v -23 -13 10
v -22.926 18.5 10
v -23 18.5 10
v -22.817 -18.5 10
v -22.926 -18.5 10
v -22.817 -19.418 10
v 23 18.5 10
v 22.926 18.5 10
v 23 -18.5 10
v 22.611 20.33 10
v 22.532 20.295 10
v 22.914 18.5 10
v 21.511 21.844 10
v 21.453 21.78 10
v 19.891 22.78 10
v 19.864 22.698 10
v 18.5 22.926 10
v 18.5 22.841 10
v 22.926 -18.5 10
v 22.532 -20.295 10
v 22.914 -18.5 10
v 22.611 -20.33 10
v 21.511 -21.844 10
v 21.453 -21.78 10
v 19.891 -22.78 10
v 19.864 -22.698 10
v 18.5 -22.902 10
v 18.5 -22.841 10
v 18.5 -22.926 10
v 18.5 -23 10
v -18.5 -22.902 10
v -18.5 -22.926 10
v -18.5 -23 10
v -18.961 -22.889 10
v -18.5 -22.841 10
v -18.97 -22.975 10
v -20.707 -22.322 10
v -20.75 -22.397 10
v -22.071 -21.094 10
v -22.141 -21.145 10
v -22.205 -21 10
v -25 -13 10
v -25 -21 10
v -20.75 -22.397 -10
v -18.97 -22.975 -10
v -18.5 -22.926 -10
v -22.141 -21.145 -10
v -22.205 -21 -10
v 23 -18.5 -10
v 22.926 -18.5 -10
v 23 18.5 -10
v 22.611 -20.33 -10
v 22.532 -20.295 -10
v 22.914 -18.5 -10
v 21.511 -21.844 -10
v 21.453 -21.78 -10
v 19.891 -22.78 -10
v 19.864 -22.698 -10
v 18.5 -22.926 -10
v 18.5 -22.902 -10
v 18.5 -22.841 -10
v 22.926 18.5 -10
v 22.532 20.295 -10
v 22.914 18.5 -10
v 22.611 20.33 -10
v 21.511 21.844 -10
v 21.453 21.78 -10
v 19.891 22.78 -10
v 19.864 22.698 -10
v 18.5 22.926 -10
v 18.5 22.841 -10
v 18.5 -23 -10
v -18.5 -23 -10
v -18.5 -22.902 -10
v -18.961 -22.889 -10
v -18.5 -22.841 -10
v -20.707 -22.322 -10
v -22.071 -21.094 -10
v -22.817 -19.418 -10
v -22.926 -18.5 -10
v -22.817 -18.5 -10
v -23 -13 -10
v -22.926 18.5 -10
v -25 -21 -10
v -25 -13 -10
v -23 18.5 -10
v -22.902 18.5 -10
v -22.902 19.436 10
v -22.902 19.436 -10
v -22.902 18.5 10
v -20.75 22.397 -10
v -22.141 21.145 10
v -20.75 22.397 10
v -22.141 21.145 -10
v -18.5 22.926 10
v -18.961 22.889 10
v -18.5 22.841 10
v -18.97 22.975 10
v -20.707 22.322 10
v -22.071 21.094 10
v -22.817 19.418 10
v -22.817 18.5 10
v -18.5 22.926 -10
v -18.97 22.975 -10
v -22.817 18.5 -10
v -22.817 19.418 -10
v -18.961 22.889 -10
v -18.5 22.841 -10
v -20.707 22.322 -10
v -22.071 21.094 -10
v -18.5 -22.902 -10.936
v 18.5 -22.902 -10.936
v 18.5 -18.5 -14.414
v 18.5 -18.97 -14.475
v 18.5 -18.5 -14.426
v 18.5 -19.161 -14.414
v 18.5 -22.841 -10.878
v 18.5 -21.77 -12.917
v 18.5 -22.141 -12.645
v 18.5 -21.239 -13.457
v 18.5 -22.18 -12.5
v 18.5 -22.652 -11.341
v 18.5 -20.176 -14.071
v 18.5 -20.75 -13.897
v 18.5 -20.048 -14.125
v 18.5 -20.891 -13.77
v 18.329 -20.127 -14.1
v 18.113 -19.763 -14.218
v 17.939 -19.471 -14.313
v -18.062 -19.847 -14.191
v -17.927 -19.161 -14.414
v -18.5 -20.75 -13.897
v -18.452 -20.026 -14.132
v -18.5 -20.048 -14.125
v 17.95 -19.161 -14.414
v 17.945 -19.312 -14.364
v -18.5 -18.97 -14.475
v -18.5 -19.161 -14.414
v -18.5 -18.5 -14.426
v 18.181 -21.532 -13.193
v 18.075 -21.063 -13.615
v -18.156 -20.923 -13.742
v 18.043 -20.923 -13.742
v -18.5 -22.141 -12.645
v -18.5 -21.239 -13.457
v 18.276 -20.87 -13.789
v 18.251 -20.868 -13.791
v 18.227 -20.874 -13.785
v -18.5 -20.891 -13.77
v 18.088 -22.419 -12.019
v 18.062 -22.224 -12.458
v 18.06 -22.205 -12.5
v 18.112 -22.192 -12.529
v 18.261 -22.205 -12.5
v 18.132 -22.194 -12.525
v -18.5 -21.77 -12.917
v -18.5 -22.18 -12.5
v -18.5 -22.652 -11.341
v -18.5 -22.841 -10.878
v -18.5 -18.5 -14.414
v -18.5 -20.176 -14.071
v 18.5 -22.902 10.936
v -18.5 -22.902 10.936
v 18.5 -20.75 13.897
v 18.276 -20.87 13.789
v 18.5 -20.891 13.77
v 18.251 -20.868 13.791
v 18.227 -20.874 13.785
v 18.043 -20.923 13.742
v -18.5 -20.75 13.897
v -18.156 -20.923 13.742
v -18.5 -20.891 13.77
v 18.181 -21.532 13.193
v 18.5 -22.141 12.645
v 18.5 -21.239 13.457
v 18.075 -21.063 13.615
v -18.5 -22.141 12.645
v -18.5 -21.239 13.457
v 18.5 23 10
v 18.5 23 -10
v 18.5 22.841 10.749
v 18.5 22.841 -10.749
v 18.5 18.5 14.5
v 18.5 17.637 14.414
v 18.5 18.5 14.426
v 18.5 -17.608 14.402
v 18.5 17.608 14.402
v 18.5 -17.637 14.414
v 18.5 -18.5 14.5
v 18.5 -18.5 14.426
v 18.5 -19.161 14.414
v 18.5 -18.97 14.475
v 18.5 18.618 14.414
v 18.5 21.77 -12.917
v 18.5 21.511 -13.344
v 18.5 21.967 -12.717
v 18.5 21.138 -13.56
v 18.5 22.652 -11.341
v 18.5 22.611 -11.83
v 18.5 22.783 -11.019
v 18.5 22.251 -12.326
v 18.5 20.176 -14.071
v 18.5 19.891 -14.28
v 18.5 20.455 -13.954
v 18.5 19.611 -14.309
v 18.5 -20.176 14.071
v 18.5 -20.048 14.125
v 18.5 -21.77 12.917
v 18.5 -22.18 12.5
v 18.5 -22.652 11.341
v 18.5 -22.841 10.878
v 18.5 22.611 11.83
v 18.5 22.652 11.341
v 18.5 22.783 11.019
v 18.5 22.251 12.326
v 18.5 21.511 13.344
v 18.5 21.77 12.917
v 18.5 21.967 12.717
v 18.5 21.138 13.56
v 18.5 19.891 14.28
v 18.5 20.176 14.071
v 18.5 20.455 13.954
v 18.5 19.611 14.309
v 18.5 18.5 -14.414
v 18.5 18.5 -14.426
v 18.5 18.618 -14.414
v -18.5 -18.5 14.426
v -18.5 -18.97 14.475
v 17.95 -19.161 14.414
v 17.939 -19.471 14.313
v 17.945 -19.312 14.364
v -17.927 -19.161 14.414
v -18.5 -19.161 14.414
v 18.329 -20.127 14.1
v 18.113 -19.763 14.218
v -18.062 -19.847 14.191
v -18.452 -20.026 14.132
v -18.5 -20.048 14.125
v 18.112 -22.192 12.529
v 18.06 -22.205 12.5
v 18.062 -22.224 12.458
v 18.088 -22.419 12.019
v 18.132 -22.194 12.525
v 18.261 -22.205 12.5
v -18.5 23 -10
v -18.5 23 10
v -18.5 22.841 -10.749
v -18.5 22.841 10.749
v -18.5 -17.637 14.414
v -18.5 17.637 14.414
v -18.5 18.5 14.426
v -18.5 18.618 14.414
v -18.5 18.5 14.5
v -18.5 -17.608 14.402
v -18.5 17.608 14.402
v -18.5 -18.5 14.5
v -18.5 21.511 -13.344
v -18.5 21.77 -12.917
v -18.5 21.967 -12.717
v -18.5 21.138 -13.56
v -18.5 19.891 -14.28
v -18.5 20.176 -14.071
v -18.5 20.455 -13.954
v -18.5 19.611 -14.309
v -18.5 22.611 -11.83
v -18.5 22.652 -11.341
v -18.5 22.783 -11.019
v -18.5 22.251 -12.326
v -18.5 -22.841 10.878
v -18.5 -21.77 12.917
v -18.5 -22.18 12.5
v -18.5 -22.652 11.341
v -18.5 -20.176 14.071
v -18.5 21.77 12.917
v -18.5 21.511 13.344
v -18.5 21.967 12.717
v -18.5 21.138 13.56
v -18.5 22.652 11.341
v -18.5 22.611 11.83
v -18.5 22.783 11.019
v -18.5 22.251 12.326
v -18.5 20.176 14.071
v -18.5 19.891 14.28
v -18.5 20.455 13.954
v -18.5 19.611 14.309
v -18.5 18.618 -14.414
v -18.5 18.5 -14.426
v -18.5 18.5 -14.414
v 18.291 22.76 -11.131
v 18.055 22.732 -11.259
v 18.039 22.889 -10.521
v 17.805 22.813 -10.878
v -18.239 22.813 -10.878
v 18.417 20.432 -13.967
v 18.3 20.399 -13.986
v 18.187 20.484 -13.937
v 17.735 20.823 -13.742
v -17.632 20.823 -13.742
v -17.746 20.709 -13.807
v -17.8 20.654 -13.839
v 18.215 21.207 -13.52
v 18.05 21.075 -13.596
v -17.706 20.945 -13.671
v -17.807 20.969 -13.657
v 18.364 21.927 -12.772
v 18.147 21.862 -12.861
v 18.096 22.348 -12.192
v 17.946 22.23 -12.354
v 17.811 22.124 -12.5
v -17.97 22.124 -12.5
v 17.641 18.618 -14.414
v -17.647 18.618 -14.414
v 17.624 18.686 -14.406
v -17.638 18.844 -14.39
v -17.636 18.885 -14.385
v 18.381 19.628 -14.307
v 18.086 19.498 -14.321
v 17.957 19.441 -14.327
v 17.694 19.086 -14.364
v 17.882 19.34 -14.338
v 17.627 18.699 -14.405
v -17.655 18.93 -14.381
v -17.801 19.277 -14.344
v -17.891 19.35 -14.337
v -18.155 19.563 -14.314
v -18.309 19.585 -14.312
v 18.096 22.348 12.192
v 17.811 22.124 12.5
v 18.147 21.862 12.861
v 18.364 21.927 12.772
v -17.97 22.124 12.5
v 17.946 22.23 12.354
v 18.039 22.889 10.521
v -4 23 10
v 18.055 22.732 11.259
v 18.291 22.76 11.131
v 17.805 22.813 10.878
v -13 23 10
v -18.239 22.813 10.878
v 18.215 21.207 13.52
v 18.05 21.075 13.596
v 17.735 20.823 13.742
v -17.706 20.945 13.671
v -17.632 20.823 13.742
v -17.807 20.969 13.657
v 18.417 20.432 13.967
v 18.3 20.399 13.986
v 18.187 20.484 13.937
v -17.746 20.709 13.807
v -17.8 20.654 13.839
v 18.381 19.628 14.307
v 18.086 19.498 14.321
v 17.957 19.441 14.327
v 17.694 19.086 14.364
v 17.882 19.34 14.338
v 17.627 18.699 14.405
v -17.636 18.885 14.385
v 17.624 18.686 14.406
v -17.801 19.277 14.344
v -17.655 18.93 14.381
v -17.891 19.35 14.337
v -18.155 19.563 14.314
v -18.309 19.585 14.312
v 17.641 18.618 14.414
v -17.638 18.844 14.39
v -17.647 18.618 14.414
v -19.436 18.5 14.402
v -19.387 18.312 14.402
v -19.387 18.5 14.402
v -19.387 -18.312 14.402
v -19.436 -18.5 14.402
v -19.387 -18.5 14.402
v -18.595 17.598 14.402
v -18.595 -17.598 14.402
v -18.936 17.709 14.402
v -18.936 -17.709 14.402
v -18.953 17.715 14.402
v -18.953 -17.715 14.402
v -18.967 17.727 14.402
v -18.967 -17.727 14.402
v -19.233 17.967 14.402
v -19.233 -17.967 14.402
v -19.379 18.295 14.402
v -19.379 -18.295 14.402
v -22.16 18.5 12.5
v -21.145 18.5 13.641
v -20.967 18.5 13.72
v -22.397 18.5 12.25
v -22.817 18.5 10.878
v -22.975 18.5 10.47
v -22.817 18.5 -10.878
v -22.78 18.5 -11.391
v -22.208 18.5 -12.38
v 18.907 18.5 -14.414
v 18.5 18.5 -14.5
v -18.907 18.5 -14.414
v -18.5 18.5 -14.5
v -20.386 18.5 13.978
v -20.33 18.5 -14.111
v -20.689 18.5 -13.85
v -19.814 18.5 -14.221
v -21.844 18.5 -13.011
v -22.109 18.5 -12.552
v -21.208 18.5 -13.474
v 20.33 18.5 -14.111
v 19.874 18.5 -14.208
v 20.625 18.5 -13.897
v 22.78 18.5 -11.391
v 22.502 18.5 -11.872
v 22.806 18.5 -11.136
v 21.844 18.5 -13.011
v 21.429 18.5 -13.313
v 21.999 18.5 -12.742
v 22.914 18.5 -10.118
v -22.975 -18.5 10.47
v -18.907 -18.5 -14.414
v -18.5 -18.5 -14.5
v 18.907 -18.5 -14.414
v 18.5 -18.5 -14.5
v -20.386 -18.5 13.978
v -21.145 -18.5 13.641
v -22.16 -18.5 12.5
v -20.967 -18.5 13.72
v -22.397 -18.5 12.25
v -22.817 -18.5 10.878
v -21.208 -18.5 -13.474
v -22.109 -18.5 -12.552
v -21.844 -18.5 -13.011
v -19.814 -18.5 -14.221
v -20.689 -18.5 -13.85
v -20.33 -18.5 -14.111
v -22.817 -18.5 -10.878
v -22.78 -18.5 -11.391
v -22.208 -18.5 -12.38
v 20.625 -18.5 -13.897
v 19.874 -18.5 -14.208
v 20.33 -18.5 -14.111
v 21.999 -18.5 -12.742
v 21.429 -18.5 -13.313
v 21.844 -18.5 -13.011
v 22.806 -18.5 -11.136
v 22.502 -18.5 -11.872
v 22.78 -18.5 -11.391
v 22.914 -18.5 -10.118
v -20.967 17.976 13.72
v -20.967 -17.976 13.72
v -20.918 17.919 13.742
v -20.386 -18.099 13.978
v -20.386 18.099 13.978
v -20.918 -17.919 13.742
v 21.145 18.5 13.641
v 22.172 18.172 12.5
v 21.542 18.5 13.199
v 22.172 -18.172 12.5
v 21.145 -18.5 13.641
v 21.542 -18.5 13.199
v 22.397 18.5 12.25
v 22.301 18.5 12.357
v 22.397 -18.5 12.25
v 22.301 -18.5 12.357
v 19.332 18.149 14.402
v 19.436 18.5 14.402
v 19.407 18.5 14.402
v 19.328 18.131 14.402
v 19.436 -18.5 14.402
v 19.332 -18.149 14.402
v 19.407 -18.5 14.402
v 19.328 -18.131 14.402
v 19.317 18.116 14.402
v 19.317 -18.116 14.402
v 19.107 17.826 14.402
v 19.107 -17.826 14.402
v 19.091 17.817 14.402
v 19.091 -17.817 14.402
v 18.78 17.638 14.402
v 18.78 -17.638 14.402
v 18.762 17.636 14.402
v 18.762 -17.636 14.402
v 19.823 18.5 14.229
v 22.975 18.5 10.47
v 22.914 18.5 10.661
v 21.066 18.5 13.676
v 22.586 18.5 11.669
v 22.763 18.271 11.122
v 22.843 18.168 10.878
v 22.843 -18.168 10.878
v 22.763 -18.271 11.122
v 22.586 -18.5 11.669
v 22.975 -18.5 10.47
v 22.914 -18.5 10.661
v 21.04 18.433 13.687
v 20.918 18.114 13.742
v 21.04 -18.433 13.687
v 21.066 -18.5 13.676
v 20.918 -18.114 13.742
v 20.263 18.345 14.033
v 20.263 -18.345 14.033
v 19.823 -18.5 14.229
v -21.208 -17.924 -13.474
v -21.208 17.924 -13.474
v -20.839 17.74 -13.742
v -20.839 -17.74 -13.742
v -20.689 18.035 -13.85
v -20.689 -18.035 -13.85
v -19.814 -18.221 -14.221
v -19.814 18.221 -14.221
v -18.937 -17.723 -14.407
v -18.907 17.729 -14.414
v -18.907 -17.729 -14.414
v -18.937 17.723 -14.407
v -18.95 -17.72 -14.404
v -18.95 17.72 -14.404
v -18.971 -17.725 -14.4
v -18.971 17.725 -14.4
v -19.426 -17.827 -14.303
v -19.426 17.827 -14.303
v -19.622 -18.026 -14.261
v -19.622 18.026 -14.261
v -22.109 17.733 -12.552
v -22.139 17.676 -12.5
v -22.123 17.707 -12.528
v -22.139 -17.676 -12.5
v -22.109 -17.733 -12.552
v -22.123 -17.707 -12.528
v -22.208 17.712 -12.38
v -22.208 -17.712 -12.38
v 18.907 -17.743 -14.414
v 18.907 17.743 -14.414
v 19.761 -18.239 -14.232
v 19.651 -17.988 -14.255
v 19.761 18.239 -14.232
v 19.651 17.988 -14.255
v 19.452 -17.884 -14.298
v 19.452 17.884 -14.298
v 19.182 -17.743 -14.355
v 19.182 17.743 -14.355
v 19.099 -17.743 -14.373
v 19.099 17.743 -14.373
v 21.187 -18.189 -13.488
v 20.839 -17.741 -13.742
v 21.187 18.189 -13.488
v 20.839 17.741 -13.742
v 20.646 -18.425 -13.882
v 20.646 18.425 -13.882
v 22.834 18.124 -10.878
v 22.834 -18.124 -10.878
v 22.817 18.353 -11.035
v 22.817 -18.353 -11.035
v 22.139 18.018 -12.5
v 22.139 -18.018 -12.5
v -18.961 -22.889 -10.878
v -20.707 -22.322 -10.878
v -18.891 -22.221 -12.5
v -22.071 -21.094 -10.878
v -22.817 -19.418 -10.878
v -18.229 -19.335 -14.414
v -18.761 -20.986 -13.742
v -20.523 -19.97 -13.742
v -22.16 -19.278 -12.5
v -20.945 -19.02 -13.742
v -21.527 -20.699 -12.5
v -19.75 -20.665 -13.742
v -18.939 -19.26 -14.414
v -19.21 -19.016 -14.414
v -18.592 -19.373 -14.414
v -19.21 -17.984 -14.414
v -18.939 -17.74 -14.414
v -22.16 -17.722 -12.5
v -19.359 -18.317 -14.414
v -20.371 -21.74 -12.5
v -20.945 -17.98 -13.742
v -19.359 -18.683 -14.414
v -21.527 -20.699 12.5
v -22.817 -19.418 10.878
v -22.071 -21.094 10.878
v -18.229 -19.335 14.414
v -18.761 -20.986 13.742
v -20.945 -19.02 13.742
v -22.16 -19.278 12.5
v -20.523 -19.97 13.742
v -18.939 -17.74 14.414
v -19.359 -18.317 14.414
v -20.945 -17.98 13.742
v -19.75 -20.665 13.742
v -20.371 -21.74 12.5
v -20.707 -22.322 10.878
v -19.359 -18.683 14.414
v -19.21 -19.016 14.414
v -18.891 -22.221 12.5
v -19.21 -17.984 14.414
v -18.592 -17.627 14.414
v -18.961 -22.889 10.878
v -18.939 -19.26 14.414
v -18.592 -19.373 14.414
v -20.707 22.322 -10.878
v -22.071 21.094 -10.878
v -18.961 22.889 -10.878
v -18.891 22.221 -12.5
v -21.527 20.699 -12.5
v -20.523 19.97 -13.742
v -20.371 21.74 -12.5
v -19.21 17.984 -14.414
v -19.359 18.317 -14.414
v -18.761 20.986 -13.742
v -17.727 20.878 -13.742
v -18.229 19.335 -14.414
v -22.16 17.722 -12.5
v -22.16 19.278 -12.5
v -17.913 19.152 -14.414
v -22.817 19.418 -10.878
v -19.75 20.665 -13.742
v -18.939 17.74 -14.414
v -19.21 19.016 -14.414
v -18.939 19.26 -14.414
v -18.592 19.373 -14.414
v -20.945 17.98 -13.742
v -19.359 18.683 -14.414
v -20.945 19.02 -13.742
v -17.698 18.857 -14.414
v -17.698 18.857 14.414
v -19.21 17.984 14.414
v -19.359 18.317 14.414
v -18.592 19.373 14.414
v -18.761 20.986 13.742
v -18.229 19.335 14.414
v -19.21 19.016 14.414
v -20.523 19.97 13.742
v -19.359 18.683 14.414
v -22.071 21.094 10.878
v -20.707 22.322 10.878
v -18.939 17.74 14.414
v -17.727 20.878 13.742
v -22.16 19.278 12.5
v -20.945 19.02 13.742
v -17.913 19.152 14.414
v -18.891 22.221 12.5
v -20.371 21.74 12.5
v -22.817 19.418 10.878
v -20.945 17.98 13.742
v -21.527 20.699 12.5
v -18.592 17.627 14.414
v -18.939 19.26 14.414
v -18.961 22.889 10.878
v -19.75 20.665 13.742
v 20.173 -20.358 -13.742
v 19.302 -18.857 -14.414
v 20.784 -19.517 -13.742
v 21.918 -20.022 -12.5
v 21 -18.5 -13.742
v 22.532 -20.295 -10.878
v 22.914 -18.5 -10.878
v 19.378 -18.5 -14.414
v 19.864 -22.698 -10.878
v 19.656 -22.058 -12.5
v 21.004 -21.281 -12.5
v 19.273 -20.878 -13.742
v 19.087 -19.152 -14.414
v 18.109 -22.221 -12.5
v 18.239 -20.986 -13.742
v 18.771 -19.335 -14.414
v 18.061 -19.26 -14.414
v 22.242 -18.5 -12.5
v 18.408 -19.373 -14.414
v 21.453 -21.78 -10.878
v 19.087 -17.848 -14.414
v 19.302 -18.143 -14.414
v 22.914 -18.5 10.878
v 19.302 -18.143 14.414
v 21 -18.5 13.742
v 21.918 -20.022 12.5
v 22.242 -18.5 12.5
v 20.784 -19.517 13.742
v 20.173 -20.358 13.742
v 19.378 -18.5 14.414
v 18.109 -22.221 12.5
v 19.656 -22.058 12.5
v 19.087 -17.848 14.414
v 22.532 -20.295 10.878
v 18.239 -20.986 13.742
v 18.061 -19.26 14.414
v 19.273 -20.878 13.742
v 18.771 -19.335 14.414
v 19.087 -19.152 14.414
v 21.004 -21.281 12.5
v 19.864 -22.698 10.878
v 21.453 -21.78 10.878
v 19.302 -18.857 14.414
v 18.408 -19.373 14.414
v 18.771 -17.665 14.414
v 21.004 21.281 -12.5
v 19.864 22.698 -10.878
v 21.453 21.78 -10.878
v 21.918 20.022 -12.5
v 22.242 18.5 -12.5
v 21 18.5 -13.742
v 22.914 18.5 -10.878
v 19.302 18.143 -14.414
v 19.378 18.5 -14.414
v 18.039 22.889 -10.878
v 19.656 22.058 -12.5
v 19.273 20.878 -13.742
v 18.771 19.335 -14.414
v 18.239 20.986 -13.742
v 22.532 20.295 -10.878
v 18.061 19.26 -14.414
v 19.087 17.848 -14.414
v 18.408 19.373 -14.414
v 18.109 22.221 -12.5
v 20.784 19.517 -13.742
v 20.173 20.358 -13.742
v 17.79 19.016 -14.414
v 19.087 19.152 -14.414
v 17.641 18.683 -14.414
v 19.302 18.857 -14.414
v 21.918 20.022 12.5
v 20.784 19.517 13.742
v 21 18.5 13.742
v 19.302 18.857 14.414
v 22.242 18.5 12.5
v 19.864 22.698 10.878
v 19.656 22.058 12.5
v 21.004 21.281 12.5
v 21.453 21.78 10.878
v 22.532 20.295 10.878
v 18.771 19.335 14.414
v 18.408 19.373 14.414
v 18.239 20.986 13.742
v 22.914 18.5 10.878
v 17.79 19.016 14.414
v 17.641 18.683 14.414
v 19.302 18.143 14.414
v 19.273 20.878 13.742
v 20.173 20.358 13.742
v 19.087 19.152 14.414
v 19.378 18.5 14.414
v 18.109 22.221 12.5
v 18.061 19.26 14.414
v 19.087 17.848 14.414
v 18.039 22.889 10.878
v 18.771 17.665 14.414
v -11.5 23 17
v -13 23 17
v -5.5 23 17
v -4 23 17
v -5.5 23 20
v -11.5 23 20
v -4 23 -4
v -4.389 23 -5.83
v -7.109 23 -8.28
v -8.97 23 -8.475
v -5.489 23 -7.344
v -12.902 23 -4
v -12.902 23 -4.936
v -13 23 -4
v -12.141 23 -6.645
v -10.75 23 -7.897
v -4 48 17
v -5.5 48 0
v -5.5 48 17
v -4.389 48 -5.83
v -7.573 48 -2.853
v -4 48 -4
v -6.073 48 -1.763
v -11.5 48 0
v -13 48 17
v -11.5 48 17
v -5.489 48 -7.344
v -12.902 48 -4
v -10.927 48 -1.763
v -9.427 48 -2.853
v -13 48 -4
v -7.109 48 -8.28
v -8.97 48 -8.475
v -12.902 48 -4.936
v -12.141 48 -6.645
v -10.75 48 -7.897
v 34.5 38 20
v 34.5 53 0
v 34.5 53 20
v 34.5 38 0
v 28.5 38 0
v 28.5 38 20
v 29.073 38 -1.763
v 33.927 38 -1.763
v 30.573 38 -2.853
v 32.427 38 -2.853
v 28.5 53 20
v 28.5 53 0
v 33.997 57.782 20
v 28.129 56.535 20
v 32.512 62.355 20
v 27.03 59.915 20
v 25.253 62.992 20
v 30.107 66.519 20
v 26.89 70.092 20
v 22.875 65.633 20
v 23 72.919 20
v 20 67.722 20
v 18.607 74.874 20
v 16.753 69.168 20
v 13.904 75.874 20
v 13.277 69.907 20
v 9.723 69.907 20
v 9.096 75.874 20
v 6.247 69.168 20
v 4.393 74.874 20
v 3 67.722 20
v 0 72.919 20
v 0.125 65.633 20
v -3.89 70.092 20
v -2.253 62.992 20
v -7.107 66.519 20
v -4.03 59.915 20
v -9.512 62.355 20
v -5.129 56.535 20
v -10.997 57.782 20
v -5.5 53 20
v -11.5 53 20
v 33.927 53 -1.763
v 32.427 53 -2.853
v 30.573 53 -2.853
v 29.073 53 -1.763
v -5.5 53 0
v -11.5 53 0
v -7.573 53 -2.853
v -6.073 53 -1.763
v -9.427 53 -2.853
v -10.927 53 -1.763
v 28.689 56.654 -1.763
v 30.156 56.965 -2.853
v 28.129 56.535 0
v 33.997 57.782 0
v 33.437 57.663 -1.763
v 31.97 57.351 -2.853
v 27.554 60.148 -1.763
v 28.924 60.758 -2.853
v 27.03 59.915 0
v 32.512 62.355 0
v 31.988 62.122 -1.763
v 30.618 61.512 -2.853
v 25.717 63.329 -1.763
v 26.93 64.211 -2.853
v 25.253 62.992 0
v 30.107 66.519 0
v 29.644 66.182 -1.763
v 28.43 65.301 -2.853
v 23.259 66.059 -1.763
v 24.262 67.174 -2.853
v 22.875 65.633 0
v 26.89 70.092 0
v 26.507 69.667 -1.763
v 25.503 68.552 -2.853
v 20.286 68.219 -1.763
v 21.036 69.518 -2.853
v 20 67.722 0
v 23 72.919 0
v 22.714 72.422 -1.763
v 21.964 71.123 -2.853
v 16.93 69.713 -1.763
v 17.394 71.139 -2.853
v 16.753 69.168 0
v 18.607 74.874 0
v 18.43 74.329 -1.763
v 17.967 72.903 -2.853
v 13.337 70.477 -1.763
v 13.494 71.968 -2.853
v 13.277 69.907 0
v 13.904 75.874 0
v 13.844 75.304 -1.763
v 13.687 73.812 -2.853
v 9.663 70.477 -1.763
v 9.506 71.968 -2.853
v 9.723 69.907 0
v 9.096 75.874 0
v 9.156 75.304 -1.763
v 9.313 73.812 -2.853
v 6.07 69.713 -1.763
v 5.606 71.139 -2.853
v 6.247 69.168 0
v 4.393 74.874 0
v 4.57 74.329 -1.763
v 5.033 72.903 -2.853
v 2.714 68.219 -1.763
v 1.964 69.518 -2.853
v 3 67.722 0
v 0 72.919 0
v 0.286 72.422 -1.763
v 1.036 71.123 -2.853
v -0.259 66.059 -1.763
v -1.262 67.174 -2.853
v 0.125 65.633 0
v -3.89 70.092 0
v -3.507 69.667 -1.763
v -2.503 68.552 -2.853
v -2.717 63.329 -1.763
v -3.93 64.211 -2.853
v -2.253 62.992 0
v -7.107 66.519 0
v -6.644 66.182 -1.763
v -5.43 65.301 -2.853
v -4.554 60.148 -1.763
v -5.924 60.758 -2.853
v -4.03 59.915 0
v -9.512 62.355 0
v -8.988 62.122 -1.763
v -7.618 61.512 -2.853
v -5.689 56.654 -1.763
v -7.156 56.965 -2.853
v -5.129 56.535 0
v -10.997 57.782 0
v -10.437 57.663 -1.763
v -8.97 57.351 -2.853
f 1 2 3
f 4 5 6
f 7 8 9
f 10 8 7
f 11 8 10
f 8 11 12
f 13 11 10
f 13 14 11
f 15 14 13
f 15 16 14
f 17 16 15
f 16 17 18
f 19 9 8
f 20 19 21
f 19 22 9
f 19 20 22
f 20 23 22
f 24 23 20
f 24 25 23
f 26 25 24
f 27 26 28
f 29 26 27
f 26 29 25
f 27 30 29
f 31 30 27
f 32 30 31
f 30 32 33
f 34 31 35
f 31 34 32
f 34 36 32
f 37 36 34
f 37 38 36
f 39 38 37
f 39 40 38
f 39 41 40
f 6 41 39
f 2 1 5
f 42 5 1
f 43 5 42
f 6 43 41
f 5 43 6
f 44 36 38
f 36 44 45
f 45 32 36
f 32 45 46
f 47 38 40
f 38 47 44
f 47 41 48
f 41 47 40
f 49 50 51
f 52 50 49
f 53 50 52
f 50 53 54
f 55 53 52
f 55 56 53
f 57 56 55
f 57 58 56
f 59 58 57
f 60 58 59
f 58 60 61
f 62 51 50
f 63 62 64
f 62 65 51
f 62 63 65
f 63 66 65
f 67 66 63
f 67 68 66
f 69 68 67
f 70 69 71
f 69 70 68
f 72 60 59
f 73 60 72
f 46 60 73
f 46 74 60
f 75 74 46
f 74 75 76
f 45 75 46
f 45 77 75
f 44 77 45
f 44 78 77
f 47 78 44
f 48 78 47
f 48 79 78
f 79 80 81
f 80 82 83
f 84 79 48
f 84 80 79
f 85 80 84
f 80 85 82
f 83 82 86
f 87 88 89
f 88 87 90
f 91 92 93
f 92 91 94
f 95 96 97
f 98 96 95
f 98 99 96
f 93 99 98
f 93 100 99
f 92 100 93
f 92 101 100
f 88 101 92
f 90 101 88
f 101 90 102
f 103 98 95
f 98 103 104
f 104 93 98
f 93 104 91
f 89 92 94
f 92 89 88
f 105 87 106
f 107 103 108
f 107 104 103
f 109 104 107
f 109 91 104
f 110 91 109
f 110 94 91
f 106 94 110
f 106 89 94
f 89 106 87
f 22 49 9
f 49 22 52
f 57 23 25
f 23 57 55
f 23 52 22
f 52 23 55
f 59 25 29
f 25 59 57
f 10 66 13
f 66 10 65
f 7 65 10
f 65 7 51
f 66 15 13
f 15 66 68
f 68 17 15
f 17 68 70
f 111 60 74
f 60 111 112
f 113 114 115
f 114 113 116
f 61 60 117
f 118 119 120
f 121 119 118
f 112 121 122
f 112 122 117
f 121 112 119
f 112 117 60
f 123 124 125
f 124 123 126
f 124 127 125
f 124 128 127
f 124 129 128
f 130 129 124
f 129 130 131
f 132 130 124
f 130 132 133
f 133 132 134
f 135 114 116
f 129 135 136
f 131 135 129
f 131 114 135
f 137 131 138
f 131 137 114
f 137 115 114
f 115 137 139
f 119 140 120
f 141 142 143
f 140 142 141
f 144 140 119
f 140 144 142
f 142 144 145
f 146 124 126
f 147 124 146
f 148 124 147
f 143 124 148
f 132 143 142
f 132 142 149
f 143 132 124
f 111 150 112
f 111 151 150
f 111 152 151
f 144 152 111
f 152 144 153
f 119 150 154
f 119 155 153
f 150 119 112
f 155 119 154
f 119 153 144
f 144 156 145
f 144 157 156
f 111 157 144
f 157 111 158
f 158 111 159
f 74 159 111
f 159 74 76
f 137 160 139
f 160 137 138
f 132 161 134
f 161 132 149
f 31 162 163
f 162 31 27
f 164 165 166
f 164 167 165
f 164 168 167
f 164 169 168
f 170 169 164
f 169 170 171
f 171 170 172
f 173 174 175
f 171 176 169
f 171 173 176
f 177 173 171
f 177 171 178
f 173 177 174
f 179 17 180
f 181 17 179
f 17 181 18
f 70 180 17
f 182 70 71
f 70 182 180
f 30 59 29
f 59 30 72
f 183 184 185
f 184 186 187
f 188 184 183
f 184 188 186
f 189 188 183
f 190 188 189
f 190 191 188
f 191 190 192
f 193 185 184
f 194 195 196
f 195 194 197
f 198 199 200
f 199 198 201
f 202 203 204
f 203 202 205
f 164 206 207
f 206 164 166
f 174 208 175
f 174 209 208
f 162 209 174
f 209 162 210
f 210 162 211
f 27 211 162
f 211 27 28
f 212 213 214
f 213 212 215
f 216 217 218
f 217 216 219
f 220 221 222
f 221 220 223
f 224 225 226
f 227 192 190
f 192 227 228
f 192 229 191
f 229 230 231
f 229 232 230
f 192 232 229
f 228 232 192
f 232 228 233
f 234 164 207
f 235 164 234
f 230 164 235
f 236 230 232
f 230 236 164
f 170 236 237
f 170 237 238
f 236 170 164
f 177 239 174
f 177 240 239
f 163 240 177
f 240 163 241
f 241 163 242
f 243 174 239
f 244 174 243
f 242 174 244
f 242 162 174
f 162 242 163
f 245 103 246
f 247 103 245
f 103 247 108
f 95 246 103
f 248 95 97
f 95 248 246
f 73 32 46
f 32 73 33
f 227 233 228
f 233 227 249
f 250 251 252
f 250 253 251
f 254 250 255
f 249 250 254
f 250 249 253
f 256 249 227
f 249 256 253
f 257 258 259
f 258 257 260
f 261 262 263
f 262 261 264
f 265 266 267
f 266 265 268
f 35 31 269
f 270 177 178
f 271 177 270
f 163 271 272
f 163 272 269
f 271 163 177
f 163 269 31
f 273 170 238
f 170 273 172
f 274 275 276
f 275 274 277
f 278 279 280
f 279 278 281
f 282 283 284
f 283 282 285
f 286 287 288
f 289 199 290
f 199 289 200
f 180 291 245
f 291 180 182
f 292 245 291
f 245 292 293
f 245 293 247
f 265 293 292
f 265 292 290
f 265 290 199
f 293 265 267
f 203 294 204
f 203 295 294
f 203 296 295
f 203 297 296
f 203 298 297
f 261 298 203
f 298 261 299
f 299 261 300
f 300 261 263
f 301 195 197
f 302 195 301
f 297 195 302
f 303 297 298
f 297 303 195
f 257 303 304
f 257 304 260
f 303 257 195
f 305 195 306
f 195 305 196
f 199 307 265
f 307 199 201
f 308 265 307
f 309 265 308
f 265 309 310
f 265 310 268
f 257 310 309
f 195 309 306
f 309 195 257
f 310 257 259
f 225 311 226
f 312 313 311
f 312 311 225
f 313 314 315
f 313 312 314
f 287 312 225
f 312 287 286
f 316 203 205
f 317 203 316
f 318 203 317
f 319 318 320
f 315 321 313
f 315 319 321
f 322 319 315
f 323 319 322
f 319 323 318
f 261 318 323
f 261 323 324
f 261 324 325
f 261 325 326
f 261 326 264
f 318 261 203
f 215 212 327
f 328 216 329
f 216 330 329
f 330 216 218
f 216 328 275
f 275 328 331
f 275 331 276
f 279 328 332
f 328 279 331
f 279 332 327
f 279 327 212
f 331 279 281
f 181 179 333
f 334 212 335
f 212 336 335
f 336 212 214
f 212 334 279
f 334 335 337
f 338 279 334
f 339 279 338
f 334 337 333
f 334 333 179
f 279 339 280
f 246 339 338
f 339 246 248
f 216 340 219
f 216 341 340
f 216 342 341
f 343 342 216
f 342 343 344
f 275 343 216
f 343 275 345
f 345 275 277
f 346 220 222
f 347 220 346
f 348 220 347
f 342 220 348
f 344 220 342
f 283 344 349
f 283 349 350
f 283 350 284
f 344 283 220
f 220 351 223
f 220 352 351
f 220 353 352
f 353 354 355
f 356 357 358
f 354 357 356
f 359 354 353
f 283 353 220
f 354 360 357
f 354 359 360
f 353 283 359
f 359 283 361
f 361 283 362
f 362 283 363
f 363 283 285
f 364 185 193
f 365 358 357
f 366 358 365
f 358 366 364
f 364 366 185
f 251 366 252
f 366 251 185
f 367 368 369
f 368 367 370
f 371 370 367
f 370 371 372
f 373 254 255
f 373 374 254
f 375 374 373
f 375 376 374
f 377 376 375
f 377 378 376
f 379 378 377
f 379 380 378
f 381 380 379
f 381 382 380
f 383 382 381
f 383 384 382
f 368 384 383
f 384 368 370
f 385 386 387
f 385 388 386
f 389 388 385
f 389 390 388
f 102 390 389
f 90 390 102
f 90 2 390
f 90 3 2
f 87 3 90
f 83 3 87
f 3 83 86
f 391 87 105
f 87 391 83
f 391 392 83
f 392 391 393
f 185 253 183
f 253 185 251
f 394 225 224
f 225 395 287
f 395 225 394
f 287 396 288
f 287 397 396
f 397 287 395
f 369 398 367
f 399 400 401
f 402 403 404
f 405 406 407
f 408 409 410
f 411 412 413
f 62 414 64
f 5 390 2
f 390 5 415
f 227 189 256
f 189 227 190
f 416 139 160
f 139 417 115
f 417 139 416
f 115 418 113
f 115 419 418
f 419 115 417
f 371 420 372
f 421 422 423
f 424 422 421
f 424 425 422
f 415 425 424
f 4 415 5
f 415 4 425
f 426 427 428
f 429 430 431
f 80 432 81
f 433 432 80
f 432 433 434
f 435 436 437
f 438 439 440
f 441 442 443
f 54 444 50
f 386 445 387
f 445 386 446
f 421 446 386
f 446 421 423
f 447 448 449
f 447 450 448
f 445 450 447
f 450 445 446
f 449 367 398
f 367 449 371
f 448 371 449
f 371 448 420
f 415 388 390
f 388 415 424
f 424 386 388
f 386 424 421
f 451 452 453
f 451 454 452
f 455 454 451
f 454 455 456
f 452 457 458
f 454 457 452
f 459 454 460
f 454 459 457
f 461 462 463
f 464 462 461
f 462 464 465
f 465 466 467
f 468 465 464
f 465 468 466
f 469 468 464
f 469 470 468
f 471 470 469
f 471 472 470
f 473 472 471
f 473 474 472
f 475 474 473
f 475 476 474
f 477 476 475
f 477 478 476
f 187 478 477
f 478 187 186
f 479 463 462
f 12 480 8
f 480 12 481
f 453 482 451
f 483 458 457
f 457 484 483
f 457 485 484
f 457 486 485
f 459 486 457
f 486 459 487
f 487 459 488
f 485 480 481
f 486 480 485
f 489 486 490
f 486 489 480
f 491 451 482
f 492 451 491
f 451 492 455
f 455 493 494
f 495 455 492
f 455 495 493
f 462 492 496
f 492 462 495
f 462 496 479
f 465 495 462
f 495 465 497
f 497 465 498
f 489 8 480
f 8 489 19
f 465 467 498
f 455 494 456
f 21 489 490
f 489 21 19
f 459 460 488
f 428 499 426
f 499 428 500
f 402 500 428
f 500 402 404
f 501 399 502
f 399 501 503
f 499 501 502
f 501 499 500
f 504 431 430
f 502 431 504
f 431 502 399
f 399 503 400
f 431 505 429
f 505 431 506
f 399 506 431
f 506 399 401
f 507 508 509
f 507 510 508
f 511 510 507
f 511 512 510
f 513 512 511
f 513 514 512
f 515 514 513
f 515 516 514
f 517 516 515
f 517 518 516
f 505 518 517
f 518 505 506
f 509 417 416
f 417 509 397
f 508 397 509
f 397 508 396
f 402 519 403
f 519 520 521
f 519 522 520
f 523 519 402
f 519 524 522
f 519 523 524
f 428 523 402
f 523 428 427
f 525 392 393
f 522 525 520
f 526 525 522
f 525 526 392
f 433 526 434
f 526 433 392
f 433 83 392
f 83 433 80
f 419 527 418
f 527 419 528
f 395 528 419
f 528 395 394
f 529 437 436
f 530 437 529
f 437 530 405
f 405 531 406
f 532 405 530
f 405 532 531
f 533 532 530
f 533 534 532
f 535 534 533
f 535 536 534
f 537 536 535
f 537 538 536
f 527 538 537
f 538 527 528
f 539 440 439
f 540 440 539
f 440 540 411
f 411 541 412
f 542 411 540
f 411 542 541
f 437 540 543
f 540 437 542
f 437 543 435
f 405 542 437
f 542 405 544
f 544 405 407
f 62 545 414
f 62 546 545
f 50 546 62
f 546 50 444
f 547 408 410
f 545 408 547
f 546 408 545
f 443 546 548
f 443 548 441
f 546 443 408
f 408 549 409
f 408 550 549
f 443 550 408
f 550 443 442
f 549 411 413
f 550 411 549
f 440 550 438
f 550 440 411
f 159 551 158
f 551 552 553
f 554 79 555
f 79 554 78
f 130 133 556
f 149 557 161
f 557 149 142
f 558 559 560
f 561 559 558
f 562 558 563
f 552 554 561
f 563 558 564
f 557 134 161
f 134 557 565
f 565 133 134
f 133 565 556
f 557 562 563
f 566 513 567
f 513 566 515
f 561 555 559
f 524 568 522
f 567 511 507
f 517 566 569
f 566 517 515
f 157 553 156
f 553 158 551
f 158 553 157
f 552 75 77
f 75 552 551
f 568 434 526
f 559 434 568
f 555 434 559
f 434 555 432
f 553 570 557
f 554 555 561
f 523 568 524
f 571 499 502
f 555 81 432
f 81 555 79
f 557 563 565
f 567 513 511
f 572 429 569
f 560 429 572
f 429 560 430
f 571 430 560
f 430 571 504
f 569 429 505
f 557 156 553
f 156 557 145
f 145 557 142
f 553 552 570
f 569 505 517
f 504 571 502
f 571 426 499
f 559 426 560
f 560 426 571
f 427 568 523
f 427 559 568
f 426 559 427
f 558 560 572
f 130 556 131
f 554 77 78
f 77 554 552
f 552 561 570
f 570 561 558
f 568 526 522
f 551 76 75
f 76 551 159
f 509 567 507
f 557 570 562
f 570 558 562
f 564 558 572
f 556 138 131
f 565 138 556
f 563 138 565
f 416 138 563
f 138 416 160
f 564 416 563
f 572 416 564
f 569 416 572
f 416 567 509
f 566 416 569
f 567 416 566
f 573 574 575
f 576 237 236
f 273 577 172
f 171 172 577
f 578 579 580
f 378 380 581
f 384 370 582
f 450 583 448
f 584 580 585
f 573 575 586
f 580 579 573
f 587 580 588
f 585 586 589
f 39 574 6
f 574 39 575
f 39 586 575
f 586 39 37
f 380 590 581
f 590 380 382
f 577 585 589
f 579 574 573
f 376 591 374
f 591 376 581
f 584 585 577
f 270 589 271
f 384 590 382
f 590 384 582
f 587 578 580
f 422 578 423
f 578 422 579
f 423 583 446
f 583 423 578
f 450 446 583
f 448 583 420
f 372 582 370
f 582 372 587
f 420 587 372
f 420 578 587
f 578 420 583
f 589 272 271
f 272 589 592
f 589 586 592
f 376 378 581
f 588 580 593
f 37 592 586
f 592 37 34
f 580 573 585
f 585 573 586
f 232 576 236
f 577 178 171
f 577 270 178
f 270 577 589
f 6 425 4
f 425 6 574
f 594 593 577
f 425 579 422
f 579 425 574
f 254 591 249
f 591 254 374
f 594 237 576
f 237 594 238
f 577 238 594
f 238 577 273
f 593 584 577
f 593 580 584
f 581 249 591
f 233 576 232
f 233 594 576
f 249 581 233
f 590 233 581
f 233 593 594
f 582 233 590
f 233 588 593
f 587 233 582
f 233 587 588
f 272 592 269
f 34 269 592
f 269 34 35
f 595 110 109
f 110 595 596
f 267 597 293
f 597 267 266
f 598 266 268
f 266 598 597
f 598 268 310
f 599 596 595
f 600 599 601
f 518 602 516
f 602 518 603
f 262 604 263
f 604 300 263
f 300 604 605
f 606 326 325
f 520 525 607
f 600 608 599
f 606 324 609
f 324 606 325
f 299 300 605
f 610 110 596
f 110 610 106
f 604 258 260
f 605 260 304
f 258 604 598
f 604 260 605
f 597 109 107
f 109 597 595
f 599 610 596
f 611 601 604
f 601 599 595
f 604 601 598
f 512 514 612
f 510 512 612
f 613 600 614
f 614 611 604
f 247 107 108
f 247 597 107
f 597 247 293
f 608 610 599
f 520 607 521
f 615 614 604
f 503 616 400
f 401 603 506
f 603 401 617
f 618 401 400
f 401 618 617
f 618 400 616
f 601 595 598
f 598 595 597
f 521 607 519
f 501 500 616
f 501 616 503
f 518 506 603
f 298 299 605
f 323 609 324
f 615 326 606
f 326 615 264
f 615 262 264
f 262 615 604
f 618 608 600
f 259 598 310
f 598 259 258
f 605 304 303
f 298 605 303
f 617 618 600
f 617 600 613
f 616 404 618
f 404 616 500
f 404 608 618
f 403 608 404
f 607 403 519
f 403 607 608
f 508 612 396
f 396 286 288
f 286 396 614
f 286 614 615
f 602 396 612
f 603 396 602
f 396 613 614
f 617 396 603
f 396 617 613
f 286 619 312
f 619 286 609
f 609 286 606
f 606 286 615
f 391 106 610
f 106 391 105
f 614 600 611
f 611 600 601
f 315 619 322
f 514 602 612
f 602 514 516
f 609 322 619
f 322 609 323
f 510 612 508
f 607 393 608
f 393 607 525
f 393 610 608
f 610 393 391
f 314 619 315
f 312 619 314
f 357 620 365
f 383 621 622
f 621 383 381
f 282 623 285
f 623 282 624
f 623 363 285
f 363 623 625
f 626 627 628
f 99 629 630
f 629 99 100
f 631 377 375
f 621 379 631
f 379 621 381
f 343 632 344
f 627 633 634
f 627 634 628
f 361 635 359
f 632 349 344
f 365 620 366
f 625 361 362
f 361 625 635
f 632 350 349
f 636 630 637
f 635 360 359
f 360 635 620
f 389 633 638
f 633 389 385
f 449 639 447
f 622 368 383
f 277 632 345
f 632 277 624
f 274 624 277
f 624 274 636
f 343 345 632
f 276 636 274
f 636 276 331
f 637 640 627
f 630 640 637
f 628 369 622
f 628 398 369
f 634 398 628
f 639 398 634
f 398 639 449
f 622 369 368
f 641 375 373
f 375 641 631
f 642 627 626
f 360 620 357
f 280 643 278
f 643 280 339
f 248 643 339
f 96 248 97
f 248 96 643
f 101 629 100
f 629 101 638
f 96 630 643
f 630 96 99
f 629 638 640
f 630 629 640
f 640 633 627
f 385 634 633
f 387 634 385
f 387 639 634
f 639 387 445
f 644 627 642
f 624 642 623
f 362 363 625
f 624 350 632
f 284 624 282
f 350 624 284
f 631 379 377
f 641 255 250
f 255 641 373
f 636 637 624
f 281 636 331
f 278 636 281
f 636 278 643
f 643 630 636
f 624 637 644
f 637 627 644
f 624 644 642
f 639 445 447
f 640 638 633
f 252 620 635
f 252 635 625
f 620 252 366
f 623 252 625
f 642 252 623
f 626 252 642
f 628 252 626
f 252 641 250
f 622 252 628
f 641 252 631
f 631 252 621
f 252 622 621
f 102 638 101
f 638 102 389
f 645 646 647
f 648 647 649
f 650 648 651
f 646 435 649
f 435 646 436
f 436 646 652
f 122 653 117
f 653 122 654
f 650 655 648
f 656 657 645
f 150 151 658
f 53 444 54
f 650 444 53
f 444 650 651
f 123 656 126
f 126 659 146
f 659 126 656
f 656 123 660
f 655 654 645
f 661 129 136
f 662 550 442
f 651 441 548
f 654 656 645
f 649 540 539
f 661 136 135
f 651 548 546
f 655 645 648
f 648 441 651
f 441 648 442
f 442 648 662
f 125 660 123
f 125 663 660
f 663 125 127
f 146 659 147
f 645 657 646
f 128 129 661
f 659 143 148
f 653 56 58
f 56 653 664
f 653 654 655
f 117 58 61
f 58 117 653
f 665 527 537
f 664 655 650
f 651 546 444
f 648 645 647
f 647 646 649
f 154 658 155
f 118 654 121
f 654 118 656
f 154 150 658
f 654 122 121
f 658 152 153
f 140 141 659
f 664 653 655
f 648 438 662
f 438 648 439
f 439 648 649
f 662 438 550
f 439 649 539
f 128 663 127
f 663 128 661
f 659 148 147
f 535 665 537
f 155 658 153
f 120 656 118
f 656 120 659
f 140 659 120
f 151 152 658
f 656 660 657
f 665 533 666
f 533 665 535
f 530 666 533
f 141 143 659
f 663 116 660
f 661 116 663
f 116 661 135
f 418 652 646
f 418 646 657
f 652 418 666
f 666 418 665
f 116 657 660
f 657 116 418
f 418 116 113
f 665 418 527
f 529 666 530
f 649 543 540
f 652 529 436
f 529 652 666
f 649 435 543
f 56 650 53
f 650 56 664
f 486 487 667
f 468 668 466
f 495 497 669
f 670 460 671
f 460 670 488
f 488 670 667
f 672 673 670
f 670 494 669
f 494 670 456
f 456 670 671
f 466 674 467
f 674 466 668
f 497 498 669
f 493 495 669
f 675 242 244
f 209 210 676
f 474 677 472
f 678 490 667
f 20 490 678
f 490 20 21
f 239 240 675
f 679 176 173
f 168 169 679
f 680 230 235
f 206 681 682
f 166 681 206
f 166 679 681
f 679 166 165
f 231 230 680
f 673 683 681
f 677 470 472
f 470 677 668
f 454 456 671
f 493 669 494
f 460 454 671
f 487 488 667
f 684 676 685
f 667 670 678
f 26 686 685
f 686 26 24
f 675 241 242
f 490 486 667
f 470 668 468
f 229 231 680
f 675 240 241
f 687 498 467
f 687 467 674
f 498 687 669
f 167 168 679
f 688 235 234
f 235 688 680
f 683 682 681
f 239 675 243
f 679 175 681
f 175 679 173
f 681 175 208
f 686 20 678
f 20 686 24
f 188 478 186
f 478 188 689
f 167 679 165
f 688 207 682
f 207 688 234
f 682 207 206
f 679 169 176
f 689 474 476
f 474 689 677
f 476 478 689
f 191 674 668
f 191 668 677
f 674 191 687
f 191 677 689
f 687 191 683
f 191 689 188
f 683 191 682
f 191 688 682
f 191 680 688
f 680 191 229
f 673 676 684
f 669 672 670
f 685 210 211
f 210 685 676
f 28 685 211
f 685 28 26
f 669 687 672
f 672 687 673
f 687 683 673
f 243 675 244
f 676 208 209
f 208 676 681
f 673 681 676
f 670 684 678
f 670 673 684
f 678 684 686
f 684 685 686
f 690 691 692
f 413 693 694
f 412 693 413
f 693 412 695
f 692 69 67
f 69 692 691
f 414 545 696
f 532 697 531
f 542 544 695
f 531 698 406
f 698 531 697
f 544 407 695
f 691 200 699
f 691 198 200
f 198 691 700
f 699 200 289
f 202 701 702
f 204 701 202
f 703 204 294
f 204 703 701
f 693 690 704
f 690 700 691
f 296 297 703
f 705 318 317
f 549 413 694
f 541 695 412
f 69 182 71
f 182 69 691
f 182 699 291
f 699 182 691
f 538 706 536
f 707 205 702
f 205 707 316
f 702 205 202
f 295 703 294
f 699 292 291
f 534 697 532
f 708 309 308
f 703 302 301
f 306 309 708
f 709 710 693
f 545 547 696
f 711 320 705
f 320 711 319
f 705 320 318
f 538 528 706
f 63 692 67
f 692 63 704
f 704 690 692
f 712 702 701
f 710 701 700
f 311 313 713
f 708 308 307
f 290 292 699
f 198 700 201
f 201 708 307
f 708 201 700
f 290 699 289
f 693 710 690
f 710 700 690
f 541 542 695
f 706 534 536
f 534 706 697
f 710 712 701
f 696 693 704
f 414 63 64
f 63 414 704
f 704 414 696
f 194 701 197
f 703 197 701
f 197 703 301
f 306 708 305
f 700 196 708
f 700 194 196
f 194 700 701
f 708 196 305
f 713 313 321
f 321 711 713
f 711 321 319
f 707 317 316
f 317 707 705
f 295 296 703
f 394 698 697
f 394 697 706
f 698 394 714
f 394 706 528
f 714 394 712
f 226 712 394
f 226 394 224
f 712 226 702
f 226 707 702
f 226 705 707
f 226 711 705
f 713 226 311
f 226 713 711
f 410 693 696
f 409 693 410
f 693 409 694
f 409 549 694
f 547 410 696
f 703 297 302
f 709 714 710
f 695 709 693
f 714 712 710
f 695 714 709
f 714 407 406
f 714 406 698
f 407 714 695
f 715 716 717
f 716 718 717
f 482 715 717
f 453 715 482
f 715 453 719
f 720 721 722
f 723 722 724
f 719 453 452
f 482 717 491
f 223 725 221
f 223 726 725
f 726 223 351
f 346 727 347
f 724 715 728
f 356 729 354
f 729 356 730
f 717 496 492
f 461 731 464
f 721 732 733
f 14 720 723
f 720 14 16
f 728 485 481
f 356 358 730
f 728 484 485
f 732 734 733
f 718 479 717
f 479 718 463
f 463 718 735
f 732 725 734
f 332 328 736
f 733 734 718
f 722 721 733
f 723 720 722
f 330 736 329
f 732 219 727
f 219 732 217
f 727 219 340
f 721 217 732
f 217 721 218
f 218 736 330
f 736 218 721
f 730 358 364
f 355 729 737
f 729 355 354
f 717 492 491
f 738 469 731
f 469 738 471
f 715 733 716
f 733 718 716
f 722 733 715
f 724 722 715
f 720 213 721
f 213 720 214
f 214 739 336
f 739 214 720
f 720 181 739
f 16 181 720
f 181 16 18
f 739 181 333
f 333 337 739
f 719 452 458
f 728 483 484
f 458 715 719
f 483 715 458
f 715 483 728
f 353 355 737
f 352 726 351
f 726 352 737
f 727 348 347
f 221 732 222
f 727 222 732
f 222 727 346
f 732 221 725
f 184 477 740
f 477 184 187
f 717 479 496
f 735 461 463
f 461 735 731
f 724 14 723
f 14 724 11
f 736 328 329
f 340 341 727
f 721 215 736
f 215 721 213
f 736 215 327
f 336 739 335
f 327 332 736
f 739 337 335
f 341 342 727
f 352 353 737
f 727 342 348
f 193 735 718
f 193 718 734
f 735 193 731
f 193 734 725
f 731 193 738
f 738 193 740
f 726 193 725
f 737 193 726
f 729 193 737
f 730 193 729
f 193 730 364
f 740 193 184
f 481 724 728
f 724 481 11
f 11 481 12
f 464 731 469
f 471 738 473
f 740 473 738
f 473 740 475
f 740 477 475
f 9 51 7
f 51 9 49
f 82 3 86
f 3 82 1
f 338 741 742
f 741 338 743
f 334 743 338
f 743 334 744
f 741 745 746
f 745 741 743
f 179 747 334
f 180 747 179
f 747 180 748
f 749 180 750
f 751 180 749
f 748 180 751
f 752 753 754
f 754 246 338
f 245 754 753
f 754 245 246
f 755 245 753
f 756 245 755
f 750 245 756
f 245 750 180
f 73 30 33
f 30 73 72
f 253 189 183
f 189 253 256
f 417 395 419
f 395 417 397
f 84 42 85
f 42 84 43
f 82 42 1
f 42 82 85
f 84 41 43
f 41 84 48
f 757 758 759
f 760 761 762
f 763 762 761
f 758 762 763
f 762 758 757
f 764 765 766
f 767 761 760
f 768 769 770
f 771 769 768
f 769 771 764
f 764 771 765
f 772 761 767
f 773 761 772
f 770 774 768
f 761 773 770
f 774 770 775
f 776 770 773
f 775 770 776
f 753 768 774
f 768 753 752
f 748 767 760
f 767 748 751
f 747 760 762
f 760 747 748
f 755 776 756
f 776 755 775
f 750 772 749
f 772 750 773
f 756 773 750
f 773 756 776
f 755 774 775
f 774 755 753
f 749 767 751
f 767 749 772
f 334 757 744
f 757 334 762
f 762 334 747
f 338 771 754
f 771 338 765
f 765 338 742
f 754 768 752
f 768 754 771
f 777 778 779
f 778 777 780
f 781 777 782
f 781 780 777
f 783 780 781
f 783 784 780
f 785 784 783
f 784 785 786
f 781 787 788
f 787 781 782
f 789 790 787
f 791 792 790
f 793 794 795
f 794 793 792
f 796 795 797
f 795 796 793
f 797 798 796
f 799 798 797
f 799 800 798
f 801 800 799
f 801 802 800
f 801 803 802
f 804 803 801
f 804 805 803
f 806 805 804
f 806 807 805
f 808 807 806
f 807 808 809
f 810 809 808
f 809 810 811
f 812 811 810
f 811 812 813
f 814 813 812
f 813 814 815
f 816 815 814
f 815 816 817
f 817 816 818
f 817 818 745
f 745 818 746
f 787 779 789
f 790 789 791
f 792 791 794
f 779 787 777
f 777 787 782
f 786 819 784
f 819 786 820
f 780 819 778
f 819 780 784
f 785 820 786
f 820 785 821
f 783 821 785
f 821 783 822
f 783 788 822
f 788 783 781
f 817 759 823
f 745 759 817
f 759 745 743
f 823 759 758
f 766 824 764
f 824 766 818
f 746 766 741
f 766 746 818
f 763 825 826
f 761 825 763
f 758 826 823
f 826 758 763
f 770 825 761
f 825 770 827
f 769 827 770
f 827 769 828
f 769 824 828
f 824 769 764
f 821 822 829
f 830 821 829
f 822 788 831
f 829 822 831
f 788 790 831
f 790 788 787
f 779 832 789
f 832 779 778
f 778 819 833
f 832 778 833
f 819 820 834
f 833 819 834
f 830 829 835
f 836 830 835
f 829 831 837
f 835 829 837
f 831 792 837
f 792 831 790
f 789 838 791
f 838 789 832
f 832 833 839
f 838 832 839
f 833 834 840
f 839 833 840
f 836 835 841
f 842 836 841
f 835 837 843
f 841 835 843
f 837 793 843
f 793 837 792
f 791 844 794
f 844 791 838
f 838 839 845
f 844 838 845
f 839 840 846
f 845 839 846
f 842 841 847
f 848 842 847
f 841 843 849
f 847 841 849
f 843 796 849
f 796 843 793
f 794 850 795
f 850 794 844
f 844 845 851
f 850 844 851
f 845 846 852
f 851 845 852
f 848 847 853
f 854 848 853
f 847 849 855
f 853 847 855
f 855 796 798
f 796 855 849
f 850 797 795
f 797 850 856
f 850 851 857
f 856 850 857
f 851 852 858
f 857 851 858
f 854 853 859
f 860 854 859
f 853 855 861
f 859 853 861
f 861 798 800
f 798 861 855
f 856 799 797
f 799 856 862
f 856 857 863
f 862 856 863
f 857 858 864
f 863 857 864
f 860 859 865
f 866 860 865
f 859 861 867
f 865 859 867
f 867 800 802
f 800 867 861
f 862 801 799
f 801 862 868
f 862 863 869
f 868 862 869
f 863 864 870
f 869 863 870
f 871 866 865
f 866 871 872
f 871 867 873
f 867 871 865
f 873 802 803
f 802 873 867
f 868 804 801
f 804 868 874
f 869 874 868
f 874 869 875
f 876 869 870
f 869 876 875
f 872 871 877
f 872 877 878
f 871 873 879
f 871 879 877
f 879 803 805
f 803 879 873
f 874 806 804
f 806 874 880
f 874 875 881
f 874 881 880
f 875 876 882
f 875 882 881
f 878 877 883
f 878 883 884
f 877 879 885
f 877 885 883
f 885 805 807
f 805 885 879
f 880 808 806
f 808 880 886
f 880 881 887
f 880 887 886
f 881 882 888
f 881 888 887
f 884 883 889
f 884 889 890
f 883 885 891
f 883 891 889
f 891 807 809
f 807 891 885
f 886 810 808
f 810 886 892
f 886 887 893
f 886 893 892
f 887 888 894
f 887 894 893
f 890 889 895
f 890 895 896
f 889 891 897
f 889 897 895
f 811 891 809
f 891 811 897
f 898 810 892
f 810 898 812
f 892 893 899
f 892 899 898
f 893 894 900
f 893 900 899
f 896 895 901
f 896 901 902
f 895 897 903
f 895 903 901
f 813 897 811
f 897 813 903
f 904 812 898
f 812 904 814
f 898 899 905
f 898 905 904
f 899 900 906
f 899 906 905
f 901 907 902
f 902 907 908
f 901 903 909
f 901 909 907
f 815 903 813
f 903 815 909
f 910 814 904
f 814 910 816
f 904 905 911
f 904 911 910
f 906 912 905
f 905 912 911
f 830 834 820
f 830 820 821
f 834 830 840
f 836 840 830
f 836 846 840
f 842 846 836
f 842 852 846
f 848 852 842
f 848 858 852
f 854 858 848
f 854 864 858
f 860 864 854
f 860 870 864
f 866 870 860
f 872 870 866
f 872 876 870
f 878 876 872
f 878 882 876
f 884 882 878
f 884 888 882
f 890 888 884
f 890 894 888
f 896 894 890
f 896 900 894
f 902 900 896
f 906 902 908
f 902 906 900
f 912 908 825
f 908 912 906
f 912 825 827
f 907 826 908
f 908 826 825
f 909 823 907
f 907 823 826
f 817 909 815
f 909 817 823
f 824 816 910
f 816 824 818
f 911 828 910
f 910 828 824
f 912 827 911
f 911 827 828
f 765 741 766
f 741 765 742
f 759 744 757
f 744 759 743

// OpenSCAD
// file: Cord.scad
// Library: Cord.scad
// Version: 1.0.0
// Author: David Bowers
// Copyright: 2022
// License: 2-clause BSD License (http://opensource.org/licenses/BSD-2-Clause)

// cord(
//  straight_section,
//  curve_radius,
//  cord_thickness,
//  degree_of_curve,
//  tail_section
// );

// EXAMPLE USAGE:
// cord();

// the tail and the start should be their own pieces
module cord(
    straight_section = 30,
    curve_radius = 20,
    cord_thickness = 6,
    degree_of_curve = 180,
    tail_section = 30
)
{
    translate([0, 0, abs(straight_section/2-tail_section/2)]){
        translate([0, -curve_radius/2, 0])
            cube(
                [cord_thickness, 
                curve_radius, 
                tail_section], 
                center=true
            );
        cylinder(
            h = tail_section, 
            d = cord_thickness, 
            center = true);
    }
    translate([-curve_radius,0,straight_section/2]){
        rotate([90,0,0]){
            rotate_extrude(angle=degree_of_curve){
                translate([curve_radius,0])
                    circle(d=cord_thickness);
                translate([curve_radius, curve_radius/2])
                    square([cord_thickness, curve_radius],                center = true);   
            }
        }
    }
    translate([-curve_radius*2, 0, 0]){
        translate([0, -curve_radius/2, 0])
        cube(
            [cord_thickness, 
            curve_radius, 
            straight_section], 
            center=true
            );
        cylinder(
        h = straight_section, 
        d = cord_thickness, 
        center = true
            );
    }
          
}
// file: Plug.scad
// Library: Plug.scad
// Version: 1.0.0
// Author: David Bowers
// Copyright: 2022
// License: 2-clause BSD License (http://opensource.org/licenses/BSD-2-Clause)

include <MCAD/boxes.scad>
use <./Cord.scad>

function cordStartLength(straight, diameter, rotation, tail) =
    let(
        degree = rotation / 360,
        circum_length = diameter * PI * degree
        )
       circum_length + straight + tail;

cord_de_straight = 30;
cord_de_curve = 20;
cord_de_thickness = 6;
cord_de_rotation = 180;
cord_de_tail = 15;

function getDefaultCordStartLen() =
    cordStartLength(cord_de_straight, cord_de_curve*2, cord_de_rotation, cord_de_tail);
    
// cord();
// The plug is (-x, y) 2nd quadrant located
// depending on given type {ipad, mac_small, mac_large}
module plug(
    plug_length = 25,
    plug_width = 22,
    plug_thick = 8,
    cord_straight = cord_de_straight,
    cord_curve = cord_de_curve,
    cord_thickness = cord_de_thickness,
    cord_rotation = cord_de_rotation,
    cord_tail = cord_de_tail,
    opposite = false
)
{
    cord_x = opposite ? cord_curve*2 : 0;
    roundedBox(
        size=[plug_thick,plug_width,plug_length],
        radius=plug_thick/2, 
        sidesonly=true
    );
    translate([0, -plug_width/2, 0])
    cube(
        [plug_thick,
        plug_width,
        plug_length],
        center=true);
    translate([cord_x, 0, abs(cord_straight-plug_length)/2])
        cord(
            cord_straight,
            cord_curve,
            cord_thickness,
            cord_rotation,
            cord_tail 
        );
}
// file: ChargerBlock.scad
// Library: ChargerBlock.scad
// Version: 1.0.0
// Author: David Bowers
// Copyright: 2022
// License: 2-clause BSD License (http://opensource.org/licenses/BSD-2-Clause)

// charger_block(charger_sqaure, charger_height, edge_radius);

// EXAMPLE USAGE:
// charger_block();

include <MCAD/boxes.scad>

module charger_block(
    charger_square = 46, 
    charger_height = 29, 
    edge_radius = 4.5)
{
    roundedBox(
        size=[charger_square,charger_square,charger_height], 
        radius=edge_radius
    );
    translate(
        [-charger_square/2,-charger_square/2+6,0]
    )
    cube(
        [4,8,20],center=true
    );
}
// main file
// Library: ipadcharger.scad
// Version: 2.0.3
// Author: David Bowers
// Copyright: 2022
// License: 2-clause BSD License (http://opensource.org/licenses/BSD-2-Clause)

// ipadCharger(include_cord:bool);

// EXAMPLE USAGE:
// ipadCharger();
// ipadCharger(false); use without cord. 

// Version Notes: 
//    Change the iPad block plug to opposite.

// TODO: The cord tail diameter should be relative to the size of the block.
// TODO: Version should be entered in from package release. 


include <MCAD/boxes.scad>

use <./ChargerBlock.scad>
use <./Plug.scad>
//use <./BodySizer.scad>

include_plug = true;
charger_square = 46; 
charger_height = 29; 
edge_radius = 4.5;
plug_length = 25;
plug_width = 17;
plug_thick = 9;
opposite = false;
cord_start_length = getDefaultCordStartLen();

function getCordStartLength() = cord_start_length;
function getChargerSquare() = charger_square;
// echo(cord_start_length);

module ipadCharger(
    w_plug = include_plug,
    block = [ 
        charger_square,
        charger_height, 
        edge_radius 
        ],
    plug = [ 
        plug_length, 
        plug_width, 
        plug_thick, 
        true 
        ]
)
{
    charger_block(
        block[0],
        block[1],
        block[2]
    );
    if (w_plug){
        translate([ -8.5, block[0]/2+plug[0]/2, 0]){
            rotate([270, 0, 0])
                plug(
                    plug[0],
                    plug[1],
                    plug[2],
                    opposite=plug[3]
                );
        }
    } 
}

ipadCharger();
